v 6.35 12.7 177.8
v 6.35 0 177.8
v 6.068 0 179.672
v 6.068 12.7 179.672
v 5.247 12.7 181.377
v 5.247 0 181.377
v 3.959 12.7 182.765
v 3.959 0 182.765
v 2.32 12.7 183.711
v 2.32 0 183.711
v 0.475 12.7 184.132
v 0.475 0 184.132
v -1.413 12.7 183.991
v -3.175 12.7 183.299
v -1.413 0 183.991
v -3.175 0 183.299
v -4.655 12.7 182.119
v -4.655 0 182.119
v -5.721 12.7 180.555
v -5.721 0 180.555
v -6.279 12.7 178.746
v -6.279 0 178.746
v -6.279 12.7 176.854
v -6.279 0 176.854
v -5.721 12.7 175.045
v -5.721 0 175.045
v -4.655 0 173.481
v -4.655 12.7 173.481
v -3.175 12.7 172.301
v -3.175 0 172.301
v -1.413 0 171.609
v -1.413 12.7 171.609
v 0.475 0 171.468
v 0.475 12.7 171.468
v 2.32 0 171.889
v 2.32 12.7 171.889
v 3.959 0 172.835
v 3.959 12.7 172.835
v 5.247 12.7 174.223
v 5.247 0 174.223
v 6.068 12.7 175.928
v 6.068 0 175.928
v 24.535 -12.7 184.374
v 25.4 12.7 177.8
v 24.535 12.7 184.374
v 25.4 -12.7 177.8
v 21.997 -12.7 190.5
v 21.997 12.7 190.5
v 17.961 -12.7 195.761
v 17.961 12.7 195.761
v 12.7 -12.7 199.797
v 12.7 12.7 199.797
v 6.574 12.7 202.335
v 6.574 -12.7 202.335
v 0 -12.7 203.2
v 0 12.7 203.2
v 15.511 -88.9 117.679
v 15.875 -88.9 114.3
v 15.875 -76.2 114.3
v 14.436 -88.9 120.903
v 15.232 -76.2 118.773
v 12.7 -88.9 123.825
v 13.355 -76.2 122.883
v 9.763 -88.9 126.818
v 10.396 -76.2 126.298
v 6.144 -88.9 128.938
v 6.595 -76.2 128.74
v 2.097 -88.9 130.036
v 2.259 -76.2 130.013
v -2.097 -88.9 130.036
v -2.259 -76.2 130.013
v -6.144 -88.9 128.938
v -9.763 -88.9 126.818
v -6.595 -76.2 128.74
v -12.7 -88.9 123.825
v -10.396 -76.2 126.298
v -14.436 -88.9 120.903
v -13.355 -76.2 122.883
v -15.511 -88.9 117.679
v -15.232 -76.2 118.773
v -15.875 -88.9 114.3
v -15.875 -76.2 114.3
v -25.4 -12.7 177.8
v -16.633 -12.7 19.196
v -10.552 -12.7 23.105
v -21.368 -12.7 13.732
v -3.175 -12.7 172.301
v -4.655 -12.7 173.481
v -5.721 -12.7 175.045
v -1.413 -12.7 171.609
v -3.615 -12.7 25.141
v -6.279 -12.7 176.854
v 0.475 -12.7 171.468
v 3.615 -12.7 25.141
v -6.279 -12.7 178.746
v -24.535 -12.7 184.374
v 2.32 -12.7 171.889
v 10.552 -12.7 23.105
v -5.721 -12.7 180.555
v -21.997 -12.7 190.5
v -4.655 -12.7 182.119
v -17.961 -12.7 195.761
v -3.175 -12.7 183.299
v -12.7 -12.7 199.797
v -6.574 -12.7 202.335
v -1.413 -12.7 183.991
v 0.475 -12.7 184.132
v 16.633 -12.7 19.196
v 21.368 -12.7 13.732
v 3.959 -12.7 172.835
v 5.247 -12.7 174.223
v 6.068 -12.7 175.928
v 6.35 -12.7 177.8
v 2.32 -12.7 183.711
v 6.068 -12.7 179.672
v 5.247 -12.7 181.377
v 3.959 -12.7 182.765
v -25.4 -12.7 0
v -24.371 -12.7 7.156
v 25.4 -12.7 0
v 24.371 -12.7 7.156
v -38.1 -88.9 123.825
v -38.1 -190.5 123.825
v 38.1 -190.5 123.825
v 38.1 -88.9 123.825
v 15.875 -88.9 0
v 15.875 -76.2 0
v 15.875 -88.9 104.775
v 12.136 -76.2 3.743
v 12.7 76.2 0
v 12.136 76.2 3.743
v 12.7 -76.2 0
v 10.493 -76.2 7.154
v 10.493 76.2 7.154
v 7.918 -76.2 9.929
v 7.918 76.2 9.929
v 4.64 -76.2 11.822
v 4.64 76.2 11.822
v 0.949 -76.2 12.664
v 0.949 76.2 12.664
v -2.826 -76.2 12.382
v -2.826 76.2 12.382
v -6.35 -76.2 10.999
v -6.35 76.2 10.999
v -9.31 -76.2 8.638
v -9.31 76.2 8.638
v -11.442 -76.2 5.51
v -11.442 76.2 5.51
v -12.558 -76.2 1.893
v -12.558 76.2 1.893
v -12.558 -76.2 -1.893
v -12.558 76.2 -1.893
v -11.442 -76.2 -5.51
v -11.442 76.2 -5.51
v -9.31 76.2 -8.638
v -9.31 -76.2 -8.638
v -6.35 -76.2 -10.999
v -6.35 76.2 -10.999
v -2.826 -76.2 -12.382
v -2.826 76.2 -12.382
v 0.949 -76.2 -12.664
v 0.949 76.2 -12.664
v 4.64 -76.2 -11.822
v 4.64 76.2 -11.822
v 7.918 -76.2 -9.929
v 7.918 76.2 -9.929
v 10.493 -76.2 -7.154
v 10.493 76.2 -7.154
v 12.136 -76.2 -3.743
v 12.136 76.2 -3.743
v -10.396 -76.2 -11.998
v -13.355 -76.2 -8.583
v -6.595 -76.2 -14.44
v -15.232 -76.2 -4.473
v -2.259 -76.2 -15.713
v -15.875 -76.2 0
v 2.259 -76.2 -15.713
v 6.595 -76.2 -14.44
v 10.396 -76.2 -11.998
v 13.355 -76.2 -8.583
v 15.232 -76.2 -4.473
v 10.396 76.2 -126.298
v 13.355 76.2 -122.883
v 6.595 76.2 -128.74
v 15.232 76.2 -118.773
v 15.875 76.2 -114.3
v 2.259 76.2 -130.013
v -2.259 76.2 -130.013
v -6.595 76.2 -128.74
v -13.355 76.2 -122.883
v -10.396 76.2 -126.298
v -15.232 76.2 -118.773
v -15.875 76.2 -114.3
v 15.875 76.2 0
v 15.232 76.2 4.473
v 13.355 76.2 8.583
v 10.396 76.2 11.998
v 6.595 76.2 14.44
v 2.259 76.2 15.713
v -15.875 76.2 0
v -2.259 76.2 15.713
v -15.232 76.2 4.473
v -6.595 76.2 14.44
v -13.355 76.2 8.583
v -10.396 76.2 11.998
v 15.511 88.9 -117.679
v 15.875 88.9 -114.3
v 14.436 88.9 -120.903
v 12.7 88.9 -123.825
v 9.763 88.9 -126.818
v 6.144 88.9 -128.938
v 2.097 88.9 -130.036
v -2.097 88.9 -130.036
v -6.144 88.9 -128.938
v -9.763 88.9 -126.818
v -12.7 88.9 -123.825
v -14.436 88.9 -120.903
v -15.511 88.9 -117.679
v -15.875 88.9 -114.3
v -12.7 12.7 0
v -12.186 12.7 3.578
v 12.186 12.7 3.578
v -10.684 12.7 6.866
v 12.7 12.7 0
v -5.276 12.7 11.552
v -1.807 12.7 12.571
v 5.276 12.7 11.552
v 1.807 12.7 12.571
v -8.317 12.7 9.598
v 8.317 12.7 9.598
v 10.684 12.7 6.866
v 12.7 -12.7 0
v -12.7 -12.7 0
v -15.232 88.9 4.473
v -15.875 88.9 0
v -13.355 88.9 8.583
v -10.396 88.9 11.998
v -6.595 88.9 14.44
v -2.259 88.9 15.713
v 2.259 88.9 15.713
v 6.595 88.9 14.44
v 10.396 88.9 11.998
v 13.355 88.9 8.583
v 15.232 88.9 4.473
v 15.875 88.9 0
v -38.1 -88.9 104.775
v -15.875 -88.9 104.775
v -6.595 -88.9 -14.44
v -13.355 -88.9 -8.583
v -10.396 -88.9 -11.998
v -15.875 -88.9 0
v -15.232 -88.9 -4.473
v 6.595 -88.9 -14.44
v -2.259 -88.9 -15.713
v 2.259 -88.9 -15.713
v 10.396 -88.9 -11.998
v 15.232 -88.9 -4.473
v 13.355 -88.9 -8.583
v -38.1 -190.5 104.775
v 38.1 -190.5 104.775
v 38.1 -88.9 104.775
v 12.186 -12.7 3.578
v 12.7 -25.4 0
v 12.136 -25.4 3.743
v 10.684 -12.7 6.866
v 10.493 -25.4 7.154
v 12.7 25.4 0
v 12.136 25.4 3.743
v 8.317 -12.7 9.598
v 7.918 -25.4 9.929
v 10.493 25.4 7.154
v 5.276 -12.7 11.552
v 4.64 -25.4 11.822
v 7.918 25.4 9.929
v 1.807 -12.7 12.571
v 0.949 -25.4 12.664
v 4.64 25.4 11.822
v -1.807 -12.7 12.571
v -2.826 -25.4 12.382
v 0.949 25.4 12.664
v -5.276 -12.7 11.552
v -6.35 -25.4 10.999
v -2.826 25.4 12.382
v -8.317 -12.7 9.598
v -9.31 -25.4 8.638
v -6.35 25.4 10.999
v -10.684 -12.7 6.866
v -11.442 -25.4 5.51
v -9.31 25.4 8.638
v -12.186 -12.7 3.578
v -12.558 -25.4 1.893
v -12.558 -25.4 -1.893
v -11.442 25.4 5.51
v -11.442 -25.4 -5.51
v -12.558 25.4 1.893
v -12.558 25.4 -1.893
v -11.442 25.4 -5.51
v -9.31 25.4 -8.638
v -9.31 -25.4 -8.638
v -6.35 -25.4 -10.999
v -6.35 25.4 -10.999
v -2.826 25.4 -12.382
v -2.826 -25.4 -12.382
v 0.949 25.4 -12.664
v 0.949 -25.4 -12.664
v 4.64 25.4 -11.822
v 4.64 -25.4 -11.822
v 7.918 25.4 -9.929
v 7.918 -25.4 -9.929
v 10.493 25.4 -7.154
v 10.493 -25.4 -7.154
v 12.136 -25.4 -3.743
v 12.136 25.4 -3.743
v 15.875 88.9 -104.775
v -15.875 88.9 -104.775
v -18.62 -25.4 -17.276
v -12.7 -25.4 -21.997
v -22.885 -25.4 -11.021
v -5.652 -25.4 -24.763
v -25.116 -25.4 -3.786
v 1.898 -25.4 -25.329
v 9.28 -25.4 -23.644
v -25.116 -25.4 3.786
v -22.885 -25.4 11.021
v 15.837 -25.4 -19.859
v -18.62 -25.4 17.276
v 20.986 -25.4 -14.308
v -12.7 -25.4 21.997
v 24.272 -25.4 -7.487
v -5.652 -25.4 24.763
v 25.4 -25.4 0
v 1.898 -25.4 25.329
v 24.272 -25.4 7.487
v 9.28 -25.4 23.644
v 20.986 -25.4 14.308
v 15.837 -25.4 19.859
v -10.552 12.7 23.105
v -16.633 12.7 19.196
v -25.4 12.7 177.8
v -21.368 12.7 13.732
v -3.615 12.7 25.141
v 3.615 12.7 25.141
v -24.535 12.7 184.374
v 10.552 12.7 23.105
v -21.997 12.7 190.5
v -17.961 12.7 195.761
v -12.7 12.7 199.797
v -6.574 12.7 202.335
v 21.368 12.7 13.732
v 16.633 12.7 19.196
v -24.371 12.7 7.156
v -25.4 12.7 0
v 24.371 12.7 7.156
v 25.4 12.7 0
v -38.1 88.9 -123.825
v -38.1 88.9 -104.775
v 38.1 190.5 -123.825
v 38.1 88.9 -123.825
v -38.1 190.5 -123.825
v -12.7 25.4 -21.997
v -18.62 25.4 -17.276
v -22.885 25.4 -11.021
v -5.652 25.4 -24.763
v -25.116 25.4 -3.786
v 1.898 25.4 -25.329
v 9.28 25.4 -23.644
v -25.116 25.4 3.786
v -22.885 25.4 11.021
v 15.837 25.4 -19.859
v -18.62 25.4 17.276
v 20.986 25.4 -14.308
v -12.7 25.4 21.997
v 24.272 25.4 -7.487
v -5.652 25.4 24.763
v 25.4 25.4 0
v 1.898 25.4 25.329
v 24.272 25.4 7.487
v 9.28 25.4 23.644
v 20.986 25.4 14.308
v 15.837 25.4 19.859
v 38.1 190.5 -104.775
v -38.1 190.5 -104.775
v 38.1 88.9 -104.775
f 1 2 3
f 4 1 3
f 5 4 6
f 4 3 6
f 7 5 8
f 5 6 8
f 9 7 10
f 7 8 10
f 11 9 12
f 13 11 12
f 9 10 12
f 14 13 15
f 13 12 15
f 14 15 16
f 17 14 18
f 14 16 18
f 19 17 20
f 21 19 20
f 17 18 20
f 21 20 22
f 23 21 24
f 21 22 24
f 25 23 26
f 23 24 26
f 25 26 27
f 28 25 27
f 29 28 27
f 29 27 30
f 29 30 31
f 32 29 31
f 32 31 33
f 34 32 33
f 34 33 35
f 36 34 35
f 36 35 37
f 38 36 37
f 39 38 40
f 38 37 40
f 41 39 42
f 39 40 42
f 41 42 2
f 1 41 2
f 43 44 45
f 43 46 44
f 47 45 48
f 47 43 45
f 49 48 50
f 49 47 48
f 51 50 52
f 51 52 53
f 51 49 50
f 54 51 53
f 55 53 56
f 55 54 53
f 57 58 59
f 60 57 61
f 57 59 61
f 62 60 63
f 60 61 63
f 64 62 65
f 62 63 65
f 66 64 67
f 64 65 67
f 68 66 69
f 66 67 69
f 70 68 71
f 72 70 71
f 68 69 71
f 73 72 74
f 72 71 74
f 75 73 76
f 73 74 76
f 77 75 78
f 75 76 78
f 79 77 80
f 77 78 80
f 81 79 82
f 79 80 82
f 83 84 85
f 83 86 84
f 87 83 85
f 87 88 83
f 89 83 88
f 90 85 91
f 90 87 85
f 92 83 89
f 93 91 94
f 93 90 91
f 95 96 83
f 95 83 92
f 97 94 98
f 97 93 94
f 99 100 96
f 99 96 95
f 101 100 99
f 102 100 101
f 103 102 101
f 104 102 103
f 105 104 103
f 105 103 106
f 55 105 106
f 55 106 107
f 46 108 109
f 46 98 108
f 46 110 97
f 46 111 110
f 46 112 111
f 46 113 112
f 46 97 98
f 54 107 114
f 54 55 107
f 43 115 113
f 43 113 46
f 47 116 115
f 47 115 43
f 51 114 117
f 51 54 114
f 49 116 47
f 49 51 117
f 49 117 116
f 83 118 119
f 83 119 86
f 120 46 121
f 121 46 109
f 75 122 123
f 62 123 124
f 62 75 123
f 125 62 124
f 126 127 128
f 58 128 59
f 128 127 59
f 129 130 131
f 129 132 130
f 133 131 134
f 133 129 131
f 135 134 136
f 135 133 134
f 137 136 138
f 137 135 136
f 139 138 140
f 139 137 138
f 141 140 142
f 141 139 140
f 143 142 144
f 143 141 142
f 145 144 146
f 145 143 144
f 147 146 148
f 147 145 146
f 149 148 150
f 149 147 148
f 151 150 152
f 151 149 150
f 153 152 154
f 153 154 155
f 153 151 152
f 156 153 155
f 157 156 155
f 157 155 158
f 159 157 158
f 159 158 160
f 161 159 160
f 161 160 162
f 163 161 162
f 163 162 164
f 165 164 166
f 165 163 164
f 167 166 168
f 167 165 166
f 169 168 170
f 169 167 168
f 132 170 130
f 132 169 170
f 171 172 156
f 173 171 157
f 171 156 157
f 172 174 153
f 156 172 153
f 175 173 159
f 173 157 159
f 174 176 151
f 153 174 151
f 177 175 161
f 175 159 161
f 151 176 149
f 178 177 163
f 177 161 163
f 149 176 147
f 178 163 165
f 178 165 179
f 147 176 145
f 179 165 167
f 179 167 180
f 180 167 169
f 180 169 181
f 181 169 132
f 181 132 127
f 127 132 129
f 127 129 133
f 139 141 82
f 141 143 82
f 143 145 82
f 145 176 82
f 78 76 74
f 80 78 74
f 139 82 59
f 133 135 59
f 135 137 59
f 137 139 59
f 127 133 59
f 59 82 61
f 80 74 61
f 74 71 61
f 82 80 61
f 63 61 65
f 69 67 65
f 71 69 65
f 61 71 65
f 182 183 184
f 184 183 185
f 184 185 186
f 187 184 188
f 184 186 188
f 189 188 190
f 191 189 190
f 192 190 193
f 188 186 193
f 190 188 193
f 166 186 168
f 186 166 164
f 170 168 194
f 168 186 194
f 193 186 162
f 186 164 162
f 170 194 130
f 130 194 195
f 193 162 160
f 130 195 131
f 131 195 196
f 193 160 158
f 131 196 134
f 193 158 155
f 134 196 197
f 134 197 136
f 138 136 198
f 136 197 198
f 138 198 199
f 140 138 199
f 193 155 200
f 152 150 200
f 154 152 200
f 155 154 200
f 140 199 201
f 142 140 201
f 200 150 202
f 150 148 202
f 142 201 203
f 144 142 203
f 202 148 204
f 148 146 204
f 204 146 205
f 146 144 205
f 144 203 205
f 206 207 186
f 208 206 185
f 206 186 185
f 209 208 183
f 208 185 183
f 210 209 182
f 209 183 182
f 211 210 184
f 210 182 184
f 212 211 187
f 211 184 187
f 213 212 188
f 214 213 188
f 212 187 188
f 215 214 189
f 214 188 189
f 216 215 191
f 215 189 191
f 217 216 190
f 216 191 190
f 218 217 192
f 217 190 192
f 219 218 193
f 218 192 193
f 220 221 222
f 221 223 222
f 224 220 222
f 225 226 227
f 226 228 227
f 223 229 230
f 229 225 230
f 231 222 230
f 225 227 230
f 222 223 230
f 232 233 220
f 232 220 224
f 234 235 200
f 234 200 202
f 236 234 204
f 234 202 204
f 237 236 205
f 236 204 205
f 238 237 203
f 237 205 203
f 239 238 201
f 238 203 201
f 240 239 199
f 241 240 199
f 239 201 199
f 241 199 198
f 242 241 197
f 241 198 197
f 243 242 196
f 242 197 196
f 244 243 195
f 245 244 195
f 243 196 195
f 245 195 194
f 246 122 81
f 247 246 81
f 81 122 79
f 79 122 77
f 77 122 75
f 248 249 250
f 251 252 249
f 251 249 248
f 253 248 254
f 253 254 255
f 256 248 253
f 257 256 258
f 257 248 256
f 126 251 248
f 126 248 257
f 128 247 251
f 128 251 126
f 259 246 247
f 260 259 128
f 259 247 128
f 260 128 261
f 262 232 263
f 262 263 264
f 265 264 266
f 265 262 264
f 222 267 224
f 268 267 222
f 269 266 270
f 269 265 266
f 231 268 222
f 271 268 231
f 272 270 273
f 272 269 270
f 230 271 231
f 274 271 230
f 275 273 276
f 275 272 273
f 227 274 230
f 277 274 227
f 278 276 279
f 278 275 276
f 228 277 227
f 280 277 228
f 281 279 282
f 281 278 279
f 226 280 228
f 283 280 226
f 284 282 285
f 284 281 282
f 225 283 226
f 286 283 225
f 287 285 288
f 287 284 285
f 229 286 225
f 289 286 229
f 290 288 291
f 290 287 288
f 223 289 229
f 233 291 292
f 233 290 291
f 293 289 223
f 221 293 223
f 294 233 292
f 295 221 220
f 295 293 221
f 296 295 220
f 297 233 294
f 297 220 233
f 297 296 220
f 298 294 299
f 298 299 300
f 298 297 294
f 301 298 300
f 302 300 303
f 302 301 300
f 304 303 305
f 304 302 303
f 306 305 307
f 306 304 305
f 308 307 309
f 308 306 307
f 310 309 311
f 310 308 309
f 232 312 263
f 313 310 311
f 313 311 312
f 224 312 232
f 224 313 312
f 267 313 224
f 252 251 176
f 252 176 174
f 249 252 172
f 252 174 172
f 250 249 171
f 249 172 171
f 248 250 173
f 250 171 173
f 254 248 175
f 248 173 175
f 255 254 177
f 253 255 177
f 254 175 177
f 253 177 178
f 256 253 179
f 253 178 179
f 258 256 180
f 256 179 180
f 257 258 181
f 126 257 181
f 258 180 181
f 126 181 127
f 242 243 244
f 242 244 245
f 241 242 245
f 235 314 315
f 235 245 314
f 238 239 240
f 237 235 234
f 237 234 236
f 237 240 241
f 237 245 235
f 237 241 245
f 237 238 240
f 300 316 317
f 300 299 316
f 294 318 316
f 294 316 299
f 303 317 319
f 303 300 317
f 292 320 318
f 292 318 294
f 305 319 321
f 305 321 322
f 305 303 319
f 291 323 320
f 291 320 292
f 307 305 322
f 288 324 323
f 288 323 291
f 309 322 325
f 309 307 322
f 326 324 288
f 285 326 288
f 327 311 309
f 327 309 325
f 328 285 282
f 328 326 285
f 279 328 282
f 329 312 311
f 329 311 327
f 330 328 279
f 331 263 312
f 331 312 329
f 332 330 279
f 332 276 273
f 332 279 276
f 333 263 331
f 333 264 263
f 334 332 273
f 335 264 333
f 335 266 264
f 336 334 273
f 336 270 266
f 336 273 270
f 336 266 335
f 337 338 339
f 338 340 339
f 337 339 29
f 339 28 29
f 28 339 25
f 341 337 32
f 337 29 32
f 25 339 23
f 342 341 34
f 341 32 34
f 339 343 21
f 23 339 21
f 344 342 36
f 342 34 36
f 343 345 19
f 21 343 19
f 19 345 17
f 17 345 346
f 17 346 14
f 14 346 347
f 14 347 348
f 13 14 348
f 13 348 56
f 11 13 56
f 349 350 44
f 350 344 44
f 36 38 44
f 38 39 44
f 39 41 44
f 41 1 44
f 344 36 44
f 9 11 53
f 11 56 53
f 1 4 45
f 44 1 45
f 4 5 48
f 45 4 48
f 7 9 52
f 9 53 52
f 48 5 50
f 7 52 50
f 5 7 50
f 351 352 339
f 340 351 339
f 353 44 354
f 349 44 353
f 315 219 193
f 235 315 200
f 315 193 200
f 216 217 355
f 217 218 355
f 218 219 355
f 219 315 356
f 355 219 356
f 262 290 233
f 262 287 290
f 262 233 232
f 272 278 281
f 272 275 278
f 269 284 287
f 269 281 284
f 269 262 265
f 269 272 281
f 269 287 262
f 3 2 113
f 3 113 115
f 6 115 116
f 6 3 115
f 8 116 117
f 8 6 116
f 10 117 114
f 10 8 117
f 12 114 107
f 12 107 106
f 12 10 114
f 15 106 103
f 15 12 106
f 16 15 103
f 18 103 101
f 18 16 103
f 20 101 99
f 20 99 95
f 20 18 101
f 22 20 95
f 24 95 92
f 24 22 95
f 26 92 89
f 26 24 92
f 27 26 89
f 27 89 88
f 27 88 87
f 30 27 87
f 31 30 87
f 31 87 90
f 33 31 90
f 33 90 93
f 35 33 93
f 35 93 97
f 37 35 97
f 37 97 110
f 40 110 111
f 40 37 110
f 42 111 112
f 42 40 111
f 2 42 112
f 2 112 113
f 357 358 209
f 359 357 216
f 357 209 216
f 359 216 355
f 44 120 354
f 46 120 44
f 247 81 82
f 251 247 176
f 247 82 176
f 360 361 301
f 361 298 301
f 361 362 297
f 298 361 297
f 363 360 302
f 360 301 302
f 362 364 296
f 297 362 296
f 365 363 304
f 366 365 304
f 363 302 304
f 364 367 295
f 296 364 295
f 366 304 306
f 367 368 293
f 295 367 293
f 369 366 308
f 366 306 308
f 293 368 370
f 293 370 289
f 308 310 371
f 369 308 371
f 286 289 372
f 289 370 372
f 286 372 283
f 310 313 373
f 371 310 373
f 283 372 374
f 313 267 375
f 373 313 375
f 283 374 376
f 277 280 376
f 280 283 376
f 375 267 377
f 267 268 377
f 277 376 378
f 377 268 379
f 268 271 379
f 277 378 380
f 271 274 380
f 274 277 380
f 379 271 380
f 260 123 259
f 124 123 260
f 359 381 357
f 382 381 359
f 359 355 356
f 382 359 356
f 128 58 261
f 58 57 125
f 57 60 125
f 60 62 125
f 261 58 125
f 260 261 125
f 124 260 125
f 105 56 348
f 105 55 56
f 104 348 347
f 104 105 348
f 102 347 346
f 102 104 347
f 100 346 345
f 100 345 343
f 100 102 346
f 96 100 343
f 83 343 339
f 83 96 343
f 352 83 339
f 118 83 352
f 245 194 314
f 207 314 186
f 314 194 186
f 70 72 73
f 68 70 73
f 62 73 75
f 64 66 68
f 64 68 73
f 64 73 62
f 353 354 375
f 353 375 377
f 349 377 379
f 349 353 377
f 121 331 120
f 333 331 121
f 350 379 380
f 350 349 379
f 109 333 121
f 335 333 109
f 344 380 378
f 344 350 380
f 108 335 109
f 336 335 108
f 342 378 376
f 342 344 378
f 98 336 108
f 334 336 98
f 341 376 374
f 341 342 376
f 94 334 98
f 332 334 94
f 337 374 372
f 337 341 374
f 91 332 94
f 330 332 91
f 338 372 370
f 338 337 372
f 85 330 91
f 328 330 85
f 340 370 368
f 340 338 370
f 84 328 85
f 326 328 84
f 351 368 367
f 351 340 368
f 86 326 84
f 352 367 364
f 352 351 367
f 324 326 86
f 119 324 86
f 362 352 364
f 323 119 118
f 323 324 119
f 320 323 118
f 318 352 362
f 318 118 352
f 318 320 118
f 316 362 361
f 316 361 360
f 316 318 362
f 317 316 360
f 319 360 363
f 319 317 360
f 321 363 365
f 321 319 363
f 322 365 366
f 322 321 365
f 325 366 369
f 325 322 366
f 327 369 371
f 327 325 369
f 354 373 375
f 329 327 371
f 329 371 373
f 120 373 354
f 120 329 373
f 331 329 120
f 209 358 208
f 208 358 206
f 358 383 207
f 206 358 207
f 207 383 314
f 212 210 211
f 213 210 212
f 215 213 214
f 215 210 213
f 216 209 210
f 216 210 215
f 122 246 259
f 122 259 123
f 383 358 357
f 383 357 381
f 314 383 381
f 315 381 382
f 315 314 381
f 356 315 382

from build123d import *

# Parameters (mm, degrees)
F0_R      = 25.4
F0_R_2    = 12.7
F1_DEPTH  = 25.4
F2_R      = 12.7
F3_DEPTH  = 76.2
F5_DEPTH  = 12.7
F6_W      = 76.2
F6_H      = 19.05
F7_DEPTH  = 101.6
F9_DEPTH  = 12.7
F10_W     = 76.2
F10_H     = 19.05
F11_DEPTH = 101.6
F12_R     = 6.35
F13_DEPTH = 12.7


with BuildPart() as f1:
    # F0 (on Front) → F1 (new body, symmetric)
    with BuildSketch(Plane.XZ):
        Circle(F0_R)
        Circle(F0_R_2, mode=Mode.SUBTRACT)
    extrude(amount=F1_DEPTH, both=True)

    # F12 (on Front) → F13 (join, symmetric)
    with BuildSketch(Plane.XZ):
        with BuildLine():
            Line((-25.4, 177.8), (-25.4, 0))
            Line((-25.4, 0), (0, 0))
            Line((0, 0), (25.4, 0))
            Line((25.4, 0), (25.4, 177.8))
            ThreePointArc((25.4, 177.8), (17.9605122421, 195.7605122421), (0, 203.2))
            ThreePointArc((0, 203.2), (-17.9605122421, 195.7605122421), (-25.4, 177.8))
        make_face()
        with Locations((0, 177.8)):
            Circle(F12_R, mode=Mode.SUBTRACT)
    extrude(amount=F13_DEPTH, both=True)


with BuildPart() as f3:
    # F2 (on Front) → F3 (new body, symmetric)
    with BuildSketch(Plane.XZ):
        Circle(F2_R)
    extrude(amount=F3_DEPTH, both=True)

    # F4 (on face) → F5 (join)
    with BuildSketch(Plane.XZ.offset(76.2)):
        with BuildLine():
            Line((-15.875, 114.3), (-15.875, 0))
            ThreePointArc((-15.875, 0), (0, -15.875), (15.875, 0))
            Line((15.875, 0), (15.875, 114.3))
            ThreePointArc((15.875, 114.3), (0, 130.175), (-15.875, 114.3))
        make_face()
    extrude(amount=F5_DEPTH)

    # F6 (on face) → F7 (join)
    with BuildSketch(Plane.XZ.offset(88.9)):
        with Locations((0, 114.3)):
            Rectangle(F6_W, F6_H)
    extrude(amount=F7_DEPTH)

    # F8 (on face) → F9 (join)
    with BuildSketch(Plane(origin=(0, 76.2, 0), x_dir=(-1, 0, 0), z_dir=(0, 1, 0))):
        with BuildLine():
            Line((15.875, -114.3), (15.875, 0))
            ThreePointArc((15.875, 0), (0, 15.875), (-15.875, 0))
            Line((-15.875, 0), (-15.875, -114.3))
            ThreePointArc((-15.875, -114.3), (0, -130.175), (15.875, -114.3))
        make_face()
    extrude(amount=F9_DEPTH)

    # F10 (on face) → F11 (join)
    with BuildSketch(Plane(origin=(0, 88.9, 0), x_dir=(-1, 0, 0), z_dir=(0, 1, 0))):
        with Locations((0, -114.3)):
            Rectangle(F10_W, F10_H)
    extrude(amount=F11_DEPTH)


solid = Compound([f1.part, f3.part])
